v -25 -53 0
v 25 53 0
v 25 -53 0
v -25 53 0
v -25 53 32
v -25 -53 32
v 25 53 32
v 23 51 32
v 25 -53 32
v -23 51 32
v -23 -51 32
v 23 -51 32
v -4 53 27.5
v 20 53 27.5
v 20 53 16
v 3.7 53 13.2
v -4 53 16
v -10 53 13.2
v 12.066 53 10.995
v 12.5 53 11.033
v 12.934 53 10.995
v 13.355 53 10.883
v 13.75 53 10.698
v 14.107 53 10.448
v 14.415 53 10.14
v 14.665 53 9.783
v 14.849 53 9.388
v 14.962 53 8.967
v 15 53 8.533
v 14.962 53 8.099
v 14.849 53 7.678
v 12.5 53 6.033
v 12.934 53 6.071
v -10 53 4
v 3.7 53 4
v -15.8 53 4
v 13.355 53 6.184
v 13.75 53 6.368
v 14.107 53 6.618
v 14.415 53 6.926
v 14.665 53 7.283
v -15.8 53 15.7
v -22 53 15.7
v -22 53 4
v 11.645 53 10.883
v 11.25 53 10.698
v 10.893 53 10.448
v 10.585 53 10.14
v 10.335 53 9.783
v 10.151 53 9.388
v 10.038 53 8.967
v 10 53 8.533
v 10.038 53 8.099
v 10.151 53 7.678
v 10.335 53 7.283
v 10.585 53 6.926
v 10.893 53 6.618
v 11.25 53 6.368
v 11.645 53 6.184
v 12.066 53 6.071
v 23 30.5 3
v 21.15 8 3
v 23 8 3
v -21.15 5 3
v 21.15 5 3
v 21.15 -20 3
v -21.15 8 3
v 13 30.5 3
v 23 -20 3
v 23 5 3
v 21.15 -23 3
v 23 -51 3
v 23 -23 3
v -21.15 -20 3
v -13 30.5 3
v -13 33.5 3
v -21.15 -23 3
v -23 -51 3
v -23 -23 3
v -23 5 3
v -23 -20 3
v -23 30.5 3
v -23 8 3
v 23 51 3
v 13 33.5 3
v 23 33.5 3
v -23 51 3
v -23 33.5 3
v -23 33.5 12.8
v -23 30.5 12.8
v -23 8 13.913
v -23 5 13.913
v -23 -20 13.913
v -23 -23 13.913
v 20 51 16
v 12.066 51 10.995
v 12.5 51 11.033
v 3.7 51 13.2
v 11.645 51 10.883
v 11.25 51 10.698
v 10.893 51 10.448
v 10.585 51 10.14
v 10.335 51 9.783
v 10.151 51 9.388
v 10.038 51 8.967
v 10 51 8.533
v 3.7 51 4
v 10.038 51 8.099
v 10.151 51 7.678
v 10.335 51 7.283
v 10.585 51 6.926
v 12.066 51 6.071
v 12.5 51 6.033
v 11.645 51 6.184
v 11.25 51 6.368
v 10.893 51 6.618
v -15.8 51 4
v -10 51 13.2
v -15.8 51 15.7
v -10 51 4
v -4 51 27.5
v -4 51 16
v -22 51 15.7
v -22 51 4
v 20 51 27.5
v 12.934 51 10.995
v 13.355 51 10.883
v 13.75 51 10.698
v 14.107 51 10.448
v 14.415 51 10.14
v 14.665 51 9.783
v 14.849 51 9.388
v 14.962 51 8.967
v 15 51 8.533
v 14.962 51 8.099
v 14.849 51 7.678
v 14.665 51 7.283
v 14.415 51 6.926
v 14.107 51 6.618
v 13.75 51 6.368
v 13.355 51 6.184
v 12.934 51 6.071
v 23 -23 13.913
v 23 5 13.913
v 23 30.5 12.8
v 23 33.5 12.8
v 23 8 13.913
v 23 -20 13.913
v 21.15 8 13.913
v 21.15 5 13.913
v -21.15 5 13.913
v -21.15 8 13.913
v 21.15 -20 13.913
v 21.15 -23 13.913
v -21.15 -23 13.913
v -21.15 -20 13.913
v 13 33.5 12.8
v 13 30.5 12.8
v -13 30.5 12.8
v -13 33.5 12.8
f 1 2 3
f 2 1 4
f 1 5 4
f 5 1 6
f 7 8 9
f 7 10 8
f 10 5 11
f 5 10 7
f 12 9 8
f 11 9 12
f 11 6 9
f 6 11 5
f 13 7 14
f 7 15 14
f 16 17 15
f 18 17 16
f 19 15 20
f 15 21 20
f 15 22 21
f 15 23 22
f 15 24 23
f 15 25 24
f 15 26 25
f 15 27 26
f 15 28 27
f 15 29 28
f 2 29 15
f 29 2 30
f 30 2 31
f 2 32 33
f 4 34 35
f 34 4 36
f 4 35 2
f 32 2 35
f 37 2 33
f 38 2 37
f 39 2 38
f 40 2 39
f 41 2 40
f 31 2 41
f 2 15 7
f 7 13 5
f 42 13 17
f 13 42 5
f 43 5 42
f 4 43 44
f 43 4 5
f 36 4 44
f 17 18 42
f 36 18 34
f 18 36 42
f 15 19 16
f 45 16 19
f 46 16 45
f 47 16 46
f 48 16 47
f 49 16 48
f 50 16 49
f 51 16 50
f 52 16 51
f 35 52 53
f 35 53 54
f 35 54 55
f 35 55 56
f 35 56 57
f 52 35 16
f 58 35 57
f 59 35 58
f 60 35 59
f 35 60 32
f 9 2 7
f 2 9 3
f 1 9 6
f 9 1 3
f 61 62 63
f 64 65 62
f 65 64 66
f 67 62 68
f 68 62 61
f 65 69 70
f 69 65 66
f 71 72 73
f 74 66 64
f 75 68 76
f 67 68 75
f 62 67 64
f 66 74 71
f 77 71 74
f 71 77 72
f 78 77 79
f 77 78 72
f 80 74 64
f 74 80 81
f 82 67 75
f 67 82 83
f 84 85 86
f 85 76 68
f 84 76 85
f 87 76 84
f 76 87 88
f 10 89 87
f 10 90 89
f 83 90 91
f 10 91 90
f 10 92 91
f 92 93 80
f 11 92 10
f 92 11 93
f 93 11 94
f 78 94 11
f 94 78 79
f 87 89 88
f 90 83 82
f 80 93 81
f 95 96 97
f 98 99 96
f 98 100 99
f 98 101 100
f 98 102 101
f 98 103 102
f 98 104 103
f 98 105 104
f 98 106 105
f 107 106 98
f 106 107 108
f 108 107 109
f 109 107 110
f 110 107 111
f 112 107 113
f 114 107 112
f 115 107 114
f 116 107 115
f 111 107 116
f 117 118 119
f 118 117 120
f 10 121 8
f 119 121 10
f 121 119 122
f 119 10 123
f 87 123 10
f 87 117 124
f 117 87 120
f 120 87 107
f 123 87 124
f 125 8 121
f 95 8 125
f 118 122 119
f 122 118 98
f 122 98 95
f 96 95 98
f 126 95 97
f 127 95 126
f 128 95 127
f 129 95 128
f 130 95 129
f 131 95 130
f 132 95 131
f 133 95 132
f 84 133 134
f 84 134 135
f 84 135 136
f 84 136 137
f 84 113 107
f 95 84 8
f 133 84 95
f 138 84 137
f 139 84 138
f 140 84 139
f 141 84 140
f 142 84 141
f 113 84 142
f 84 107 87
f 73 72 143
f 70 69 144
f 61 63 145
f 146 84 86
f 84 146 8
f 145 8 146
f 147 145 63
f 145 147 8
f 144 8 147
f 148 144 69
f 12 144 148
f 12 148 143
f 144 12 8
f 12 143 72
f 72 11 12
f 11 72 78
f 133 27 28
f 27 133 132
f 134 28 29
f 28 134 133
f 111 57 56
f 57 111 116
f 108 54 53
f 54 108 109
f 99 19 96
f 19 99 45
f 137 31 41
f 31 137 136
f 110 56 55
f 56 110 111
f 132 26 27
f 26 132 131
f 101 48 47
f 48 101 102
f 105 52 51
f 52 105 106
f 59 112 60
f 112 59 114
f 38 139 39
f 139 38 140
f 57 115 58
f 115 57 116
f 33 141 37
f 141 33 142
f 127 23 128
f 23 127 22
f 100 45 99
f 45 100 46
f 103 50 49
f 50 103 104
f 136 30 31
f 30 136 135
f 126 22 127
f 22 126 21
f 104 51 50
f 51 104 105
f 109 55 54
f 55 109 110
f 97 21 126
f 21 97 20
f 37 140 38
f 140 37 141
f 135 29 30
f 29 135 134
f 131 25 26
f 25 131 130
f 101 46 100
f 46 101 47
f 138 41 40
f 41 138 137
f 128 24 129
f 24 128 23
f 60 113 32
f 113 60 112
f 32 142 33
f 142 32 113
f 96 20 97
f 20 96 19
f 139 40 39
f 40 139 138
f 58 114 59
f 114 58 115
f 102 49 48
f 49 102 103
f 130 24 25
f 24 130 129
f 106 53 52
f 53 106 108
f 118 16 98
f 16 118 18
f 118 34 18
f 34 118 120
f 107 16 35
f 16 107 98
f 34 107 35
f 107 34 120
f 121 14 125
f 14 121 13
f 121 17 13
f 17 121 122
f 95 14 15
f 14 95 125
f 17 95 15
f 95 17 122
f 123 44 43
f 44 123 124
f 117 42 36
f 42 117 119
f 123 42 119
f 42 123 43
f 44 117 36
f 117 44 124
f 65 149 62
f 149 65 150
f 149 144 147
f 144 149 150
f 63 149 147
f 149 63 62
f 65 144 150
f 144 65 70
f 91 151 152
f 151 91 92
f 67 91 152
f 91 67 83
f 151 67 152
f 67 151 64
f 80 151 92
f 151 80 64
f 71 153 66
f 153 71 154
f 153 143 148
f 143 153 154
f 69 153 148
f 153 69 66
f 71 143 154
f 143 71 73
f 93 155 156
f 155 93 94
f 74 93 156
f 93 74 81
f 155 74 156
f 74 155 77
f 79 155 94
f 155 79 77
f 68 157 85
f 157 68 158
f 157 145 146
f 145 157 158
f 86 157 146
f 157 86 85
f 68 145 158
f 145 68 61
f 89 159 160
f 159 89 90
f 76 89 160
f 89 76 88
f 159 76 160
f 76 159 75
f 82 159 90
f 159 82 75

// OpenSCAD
// file: vars.scad
echo(version=version());
//All dimensions are in mm


batteryHolder3s=[69,110.0];
batteryHolder2s=[50,106.0];
h=32;    // height of box without lid
wall=2;  // wall thickness
postloc=28; // where the edge posts are in y direction
postsize=[1.85,3] ;  //Dimension of posts in x and y
basethickness=3;
holdslotloc=81.5;
holdslotwidth=10;
wireholddiameter = 5.0;
switchcutout = [13.7, 9.2];
switchDepth = 16.0;
//Perforation size: 23mm*10.5mm
voltMeterCutout=[24,11.5];
// Allow for slip by making the ridge a little smaller than the box it fits into.
interference=0.8;
Usb15=[17.2,11.7];
usbCPortStandoff=2.0;
usbConnector=[10,7.0,4.2];
circuitBoardThick=2.0;

Usb15Package=[Usb15.x+usbCPortStandoff, Usb15.y,circuitBoardThick+usbConnector.z];
// main file
include <vars.scad>;
// simple 2D -> 3D extrusion of a rectangle
color("red")
   difference() {
        linear_extrude(height = h)
            square(batteryHolder2s, center = true);
       translate ([0,0,basethickness])
         linear_extrude(height = h)
            square([batteryHolder2s.x-2*wall, batteryHolder2s.y-2*wall
            ], center = true)   ;
// Hole for the wires
      translate([+batteryHolder2s.x/4,batteryHolder2s.y/2+1,h/3*.8])
      rotate([90,0,0])
      cylinder(h = wall*5,
              r1 = wireholddiameter/2,
              r2 = wireholddiameter/2,
              $fn = 36,
              center = false);  //Dimension of posts in x and y
//  Hole for the small switch
      translate([-batteryHolder2s.x/5,batteryHolder2s.y/2+1, wall+2])
      rotate([90,0,0])
          linear_extrude(height = 5)
              square(switchcutout, center = false);


// this hole is for a small voltmeter
     smallVoltmeter([-4,batteryHolder2s.y/2+2,h/2],[90,0,0]);
     // Hole for the USB Charging connector
     usbC15VBoard(size=Usb15Package ,
                    translation=[-batteryHolder2s.x/2+wall+1,
                    batteryHolder2s.y/2-Usb15Package.x+.01,wall+2],
                    rotation=[90,0,90]);

       }


sidepost(batteryHolder2s.x/2-wall-postsize[0],-batteryHolder2s.y/2+wall + 2*postloc);
sidepost(-batteryHolder2s.x/2+wall,-batteryHolder2s.y/2+wall + 2*postloc);
sidepost(batteryHolder2s.x/2-wall-postsize[0],-batteryHolder2s.y/2+wall + postloc);
sidepost(-batteryHolder2s.x/2+wall,-batteryHolder2s.y/2+wall + postloc);


holdslot(  batteryHolder2s.x/2-wall-holdslotwidth,
         -batteryHolder2s.y/2+wall + holdslotloc,
          holdslotwidth);

holdslot(  -batteryHolder2s.x/2+wall,
          -batteryHolder2s.y/2+wall  + holdslotloc,
          holdslotwidth);


module sidepost(x=0,y=0, postcolor="blue") {
   color(postcolor)
    translate ([x,y,basethickness])

        linear_extrude(height = h/2.3-basethickness)
            square(postsize, center = false);
}

module smallVoltmeter(translation=[0,0,0], rotation=[0,0,0], color="green")
{
  color(color)
  translate(translation)
  rotate(rotation)
      linear_extrude(height = 5)
          square(voltMeterCutout,
          center = false);
}

module usbC15VBoard(size=[0,0,0],translation=[0,0,0], rotation=[0,0,0], color="lightblue")
{
  color(color)
  translate(translation)
  rotate(rotation)
      linear_extrude(height = size.z)
          square([size.x,size.y],
          center = false);

}
module holdslot(x=0,y=0, width=10, postcolor="yellow") {
   color(postcolor)
    translate ([x,y,basethickness])

        linear_extrude(height = h/2.5-basethickness)
            square([width, 3
            ], center = false);
}
